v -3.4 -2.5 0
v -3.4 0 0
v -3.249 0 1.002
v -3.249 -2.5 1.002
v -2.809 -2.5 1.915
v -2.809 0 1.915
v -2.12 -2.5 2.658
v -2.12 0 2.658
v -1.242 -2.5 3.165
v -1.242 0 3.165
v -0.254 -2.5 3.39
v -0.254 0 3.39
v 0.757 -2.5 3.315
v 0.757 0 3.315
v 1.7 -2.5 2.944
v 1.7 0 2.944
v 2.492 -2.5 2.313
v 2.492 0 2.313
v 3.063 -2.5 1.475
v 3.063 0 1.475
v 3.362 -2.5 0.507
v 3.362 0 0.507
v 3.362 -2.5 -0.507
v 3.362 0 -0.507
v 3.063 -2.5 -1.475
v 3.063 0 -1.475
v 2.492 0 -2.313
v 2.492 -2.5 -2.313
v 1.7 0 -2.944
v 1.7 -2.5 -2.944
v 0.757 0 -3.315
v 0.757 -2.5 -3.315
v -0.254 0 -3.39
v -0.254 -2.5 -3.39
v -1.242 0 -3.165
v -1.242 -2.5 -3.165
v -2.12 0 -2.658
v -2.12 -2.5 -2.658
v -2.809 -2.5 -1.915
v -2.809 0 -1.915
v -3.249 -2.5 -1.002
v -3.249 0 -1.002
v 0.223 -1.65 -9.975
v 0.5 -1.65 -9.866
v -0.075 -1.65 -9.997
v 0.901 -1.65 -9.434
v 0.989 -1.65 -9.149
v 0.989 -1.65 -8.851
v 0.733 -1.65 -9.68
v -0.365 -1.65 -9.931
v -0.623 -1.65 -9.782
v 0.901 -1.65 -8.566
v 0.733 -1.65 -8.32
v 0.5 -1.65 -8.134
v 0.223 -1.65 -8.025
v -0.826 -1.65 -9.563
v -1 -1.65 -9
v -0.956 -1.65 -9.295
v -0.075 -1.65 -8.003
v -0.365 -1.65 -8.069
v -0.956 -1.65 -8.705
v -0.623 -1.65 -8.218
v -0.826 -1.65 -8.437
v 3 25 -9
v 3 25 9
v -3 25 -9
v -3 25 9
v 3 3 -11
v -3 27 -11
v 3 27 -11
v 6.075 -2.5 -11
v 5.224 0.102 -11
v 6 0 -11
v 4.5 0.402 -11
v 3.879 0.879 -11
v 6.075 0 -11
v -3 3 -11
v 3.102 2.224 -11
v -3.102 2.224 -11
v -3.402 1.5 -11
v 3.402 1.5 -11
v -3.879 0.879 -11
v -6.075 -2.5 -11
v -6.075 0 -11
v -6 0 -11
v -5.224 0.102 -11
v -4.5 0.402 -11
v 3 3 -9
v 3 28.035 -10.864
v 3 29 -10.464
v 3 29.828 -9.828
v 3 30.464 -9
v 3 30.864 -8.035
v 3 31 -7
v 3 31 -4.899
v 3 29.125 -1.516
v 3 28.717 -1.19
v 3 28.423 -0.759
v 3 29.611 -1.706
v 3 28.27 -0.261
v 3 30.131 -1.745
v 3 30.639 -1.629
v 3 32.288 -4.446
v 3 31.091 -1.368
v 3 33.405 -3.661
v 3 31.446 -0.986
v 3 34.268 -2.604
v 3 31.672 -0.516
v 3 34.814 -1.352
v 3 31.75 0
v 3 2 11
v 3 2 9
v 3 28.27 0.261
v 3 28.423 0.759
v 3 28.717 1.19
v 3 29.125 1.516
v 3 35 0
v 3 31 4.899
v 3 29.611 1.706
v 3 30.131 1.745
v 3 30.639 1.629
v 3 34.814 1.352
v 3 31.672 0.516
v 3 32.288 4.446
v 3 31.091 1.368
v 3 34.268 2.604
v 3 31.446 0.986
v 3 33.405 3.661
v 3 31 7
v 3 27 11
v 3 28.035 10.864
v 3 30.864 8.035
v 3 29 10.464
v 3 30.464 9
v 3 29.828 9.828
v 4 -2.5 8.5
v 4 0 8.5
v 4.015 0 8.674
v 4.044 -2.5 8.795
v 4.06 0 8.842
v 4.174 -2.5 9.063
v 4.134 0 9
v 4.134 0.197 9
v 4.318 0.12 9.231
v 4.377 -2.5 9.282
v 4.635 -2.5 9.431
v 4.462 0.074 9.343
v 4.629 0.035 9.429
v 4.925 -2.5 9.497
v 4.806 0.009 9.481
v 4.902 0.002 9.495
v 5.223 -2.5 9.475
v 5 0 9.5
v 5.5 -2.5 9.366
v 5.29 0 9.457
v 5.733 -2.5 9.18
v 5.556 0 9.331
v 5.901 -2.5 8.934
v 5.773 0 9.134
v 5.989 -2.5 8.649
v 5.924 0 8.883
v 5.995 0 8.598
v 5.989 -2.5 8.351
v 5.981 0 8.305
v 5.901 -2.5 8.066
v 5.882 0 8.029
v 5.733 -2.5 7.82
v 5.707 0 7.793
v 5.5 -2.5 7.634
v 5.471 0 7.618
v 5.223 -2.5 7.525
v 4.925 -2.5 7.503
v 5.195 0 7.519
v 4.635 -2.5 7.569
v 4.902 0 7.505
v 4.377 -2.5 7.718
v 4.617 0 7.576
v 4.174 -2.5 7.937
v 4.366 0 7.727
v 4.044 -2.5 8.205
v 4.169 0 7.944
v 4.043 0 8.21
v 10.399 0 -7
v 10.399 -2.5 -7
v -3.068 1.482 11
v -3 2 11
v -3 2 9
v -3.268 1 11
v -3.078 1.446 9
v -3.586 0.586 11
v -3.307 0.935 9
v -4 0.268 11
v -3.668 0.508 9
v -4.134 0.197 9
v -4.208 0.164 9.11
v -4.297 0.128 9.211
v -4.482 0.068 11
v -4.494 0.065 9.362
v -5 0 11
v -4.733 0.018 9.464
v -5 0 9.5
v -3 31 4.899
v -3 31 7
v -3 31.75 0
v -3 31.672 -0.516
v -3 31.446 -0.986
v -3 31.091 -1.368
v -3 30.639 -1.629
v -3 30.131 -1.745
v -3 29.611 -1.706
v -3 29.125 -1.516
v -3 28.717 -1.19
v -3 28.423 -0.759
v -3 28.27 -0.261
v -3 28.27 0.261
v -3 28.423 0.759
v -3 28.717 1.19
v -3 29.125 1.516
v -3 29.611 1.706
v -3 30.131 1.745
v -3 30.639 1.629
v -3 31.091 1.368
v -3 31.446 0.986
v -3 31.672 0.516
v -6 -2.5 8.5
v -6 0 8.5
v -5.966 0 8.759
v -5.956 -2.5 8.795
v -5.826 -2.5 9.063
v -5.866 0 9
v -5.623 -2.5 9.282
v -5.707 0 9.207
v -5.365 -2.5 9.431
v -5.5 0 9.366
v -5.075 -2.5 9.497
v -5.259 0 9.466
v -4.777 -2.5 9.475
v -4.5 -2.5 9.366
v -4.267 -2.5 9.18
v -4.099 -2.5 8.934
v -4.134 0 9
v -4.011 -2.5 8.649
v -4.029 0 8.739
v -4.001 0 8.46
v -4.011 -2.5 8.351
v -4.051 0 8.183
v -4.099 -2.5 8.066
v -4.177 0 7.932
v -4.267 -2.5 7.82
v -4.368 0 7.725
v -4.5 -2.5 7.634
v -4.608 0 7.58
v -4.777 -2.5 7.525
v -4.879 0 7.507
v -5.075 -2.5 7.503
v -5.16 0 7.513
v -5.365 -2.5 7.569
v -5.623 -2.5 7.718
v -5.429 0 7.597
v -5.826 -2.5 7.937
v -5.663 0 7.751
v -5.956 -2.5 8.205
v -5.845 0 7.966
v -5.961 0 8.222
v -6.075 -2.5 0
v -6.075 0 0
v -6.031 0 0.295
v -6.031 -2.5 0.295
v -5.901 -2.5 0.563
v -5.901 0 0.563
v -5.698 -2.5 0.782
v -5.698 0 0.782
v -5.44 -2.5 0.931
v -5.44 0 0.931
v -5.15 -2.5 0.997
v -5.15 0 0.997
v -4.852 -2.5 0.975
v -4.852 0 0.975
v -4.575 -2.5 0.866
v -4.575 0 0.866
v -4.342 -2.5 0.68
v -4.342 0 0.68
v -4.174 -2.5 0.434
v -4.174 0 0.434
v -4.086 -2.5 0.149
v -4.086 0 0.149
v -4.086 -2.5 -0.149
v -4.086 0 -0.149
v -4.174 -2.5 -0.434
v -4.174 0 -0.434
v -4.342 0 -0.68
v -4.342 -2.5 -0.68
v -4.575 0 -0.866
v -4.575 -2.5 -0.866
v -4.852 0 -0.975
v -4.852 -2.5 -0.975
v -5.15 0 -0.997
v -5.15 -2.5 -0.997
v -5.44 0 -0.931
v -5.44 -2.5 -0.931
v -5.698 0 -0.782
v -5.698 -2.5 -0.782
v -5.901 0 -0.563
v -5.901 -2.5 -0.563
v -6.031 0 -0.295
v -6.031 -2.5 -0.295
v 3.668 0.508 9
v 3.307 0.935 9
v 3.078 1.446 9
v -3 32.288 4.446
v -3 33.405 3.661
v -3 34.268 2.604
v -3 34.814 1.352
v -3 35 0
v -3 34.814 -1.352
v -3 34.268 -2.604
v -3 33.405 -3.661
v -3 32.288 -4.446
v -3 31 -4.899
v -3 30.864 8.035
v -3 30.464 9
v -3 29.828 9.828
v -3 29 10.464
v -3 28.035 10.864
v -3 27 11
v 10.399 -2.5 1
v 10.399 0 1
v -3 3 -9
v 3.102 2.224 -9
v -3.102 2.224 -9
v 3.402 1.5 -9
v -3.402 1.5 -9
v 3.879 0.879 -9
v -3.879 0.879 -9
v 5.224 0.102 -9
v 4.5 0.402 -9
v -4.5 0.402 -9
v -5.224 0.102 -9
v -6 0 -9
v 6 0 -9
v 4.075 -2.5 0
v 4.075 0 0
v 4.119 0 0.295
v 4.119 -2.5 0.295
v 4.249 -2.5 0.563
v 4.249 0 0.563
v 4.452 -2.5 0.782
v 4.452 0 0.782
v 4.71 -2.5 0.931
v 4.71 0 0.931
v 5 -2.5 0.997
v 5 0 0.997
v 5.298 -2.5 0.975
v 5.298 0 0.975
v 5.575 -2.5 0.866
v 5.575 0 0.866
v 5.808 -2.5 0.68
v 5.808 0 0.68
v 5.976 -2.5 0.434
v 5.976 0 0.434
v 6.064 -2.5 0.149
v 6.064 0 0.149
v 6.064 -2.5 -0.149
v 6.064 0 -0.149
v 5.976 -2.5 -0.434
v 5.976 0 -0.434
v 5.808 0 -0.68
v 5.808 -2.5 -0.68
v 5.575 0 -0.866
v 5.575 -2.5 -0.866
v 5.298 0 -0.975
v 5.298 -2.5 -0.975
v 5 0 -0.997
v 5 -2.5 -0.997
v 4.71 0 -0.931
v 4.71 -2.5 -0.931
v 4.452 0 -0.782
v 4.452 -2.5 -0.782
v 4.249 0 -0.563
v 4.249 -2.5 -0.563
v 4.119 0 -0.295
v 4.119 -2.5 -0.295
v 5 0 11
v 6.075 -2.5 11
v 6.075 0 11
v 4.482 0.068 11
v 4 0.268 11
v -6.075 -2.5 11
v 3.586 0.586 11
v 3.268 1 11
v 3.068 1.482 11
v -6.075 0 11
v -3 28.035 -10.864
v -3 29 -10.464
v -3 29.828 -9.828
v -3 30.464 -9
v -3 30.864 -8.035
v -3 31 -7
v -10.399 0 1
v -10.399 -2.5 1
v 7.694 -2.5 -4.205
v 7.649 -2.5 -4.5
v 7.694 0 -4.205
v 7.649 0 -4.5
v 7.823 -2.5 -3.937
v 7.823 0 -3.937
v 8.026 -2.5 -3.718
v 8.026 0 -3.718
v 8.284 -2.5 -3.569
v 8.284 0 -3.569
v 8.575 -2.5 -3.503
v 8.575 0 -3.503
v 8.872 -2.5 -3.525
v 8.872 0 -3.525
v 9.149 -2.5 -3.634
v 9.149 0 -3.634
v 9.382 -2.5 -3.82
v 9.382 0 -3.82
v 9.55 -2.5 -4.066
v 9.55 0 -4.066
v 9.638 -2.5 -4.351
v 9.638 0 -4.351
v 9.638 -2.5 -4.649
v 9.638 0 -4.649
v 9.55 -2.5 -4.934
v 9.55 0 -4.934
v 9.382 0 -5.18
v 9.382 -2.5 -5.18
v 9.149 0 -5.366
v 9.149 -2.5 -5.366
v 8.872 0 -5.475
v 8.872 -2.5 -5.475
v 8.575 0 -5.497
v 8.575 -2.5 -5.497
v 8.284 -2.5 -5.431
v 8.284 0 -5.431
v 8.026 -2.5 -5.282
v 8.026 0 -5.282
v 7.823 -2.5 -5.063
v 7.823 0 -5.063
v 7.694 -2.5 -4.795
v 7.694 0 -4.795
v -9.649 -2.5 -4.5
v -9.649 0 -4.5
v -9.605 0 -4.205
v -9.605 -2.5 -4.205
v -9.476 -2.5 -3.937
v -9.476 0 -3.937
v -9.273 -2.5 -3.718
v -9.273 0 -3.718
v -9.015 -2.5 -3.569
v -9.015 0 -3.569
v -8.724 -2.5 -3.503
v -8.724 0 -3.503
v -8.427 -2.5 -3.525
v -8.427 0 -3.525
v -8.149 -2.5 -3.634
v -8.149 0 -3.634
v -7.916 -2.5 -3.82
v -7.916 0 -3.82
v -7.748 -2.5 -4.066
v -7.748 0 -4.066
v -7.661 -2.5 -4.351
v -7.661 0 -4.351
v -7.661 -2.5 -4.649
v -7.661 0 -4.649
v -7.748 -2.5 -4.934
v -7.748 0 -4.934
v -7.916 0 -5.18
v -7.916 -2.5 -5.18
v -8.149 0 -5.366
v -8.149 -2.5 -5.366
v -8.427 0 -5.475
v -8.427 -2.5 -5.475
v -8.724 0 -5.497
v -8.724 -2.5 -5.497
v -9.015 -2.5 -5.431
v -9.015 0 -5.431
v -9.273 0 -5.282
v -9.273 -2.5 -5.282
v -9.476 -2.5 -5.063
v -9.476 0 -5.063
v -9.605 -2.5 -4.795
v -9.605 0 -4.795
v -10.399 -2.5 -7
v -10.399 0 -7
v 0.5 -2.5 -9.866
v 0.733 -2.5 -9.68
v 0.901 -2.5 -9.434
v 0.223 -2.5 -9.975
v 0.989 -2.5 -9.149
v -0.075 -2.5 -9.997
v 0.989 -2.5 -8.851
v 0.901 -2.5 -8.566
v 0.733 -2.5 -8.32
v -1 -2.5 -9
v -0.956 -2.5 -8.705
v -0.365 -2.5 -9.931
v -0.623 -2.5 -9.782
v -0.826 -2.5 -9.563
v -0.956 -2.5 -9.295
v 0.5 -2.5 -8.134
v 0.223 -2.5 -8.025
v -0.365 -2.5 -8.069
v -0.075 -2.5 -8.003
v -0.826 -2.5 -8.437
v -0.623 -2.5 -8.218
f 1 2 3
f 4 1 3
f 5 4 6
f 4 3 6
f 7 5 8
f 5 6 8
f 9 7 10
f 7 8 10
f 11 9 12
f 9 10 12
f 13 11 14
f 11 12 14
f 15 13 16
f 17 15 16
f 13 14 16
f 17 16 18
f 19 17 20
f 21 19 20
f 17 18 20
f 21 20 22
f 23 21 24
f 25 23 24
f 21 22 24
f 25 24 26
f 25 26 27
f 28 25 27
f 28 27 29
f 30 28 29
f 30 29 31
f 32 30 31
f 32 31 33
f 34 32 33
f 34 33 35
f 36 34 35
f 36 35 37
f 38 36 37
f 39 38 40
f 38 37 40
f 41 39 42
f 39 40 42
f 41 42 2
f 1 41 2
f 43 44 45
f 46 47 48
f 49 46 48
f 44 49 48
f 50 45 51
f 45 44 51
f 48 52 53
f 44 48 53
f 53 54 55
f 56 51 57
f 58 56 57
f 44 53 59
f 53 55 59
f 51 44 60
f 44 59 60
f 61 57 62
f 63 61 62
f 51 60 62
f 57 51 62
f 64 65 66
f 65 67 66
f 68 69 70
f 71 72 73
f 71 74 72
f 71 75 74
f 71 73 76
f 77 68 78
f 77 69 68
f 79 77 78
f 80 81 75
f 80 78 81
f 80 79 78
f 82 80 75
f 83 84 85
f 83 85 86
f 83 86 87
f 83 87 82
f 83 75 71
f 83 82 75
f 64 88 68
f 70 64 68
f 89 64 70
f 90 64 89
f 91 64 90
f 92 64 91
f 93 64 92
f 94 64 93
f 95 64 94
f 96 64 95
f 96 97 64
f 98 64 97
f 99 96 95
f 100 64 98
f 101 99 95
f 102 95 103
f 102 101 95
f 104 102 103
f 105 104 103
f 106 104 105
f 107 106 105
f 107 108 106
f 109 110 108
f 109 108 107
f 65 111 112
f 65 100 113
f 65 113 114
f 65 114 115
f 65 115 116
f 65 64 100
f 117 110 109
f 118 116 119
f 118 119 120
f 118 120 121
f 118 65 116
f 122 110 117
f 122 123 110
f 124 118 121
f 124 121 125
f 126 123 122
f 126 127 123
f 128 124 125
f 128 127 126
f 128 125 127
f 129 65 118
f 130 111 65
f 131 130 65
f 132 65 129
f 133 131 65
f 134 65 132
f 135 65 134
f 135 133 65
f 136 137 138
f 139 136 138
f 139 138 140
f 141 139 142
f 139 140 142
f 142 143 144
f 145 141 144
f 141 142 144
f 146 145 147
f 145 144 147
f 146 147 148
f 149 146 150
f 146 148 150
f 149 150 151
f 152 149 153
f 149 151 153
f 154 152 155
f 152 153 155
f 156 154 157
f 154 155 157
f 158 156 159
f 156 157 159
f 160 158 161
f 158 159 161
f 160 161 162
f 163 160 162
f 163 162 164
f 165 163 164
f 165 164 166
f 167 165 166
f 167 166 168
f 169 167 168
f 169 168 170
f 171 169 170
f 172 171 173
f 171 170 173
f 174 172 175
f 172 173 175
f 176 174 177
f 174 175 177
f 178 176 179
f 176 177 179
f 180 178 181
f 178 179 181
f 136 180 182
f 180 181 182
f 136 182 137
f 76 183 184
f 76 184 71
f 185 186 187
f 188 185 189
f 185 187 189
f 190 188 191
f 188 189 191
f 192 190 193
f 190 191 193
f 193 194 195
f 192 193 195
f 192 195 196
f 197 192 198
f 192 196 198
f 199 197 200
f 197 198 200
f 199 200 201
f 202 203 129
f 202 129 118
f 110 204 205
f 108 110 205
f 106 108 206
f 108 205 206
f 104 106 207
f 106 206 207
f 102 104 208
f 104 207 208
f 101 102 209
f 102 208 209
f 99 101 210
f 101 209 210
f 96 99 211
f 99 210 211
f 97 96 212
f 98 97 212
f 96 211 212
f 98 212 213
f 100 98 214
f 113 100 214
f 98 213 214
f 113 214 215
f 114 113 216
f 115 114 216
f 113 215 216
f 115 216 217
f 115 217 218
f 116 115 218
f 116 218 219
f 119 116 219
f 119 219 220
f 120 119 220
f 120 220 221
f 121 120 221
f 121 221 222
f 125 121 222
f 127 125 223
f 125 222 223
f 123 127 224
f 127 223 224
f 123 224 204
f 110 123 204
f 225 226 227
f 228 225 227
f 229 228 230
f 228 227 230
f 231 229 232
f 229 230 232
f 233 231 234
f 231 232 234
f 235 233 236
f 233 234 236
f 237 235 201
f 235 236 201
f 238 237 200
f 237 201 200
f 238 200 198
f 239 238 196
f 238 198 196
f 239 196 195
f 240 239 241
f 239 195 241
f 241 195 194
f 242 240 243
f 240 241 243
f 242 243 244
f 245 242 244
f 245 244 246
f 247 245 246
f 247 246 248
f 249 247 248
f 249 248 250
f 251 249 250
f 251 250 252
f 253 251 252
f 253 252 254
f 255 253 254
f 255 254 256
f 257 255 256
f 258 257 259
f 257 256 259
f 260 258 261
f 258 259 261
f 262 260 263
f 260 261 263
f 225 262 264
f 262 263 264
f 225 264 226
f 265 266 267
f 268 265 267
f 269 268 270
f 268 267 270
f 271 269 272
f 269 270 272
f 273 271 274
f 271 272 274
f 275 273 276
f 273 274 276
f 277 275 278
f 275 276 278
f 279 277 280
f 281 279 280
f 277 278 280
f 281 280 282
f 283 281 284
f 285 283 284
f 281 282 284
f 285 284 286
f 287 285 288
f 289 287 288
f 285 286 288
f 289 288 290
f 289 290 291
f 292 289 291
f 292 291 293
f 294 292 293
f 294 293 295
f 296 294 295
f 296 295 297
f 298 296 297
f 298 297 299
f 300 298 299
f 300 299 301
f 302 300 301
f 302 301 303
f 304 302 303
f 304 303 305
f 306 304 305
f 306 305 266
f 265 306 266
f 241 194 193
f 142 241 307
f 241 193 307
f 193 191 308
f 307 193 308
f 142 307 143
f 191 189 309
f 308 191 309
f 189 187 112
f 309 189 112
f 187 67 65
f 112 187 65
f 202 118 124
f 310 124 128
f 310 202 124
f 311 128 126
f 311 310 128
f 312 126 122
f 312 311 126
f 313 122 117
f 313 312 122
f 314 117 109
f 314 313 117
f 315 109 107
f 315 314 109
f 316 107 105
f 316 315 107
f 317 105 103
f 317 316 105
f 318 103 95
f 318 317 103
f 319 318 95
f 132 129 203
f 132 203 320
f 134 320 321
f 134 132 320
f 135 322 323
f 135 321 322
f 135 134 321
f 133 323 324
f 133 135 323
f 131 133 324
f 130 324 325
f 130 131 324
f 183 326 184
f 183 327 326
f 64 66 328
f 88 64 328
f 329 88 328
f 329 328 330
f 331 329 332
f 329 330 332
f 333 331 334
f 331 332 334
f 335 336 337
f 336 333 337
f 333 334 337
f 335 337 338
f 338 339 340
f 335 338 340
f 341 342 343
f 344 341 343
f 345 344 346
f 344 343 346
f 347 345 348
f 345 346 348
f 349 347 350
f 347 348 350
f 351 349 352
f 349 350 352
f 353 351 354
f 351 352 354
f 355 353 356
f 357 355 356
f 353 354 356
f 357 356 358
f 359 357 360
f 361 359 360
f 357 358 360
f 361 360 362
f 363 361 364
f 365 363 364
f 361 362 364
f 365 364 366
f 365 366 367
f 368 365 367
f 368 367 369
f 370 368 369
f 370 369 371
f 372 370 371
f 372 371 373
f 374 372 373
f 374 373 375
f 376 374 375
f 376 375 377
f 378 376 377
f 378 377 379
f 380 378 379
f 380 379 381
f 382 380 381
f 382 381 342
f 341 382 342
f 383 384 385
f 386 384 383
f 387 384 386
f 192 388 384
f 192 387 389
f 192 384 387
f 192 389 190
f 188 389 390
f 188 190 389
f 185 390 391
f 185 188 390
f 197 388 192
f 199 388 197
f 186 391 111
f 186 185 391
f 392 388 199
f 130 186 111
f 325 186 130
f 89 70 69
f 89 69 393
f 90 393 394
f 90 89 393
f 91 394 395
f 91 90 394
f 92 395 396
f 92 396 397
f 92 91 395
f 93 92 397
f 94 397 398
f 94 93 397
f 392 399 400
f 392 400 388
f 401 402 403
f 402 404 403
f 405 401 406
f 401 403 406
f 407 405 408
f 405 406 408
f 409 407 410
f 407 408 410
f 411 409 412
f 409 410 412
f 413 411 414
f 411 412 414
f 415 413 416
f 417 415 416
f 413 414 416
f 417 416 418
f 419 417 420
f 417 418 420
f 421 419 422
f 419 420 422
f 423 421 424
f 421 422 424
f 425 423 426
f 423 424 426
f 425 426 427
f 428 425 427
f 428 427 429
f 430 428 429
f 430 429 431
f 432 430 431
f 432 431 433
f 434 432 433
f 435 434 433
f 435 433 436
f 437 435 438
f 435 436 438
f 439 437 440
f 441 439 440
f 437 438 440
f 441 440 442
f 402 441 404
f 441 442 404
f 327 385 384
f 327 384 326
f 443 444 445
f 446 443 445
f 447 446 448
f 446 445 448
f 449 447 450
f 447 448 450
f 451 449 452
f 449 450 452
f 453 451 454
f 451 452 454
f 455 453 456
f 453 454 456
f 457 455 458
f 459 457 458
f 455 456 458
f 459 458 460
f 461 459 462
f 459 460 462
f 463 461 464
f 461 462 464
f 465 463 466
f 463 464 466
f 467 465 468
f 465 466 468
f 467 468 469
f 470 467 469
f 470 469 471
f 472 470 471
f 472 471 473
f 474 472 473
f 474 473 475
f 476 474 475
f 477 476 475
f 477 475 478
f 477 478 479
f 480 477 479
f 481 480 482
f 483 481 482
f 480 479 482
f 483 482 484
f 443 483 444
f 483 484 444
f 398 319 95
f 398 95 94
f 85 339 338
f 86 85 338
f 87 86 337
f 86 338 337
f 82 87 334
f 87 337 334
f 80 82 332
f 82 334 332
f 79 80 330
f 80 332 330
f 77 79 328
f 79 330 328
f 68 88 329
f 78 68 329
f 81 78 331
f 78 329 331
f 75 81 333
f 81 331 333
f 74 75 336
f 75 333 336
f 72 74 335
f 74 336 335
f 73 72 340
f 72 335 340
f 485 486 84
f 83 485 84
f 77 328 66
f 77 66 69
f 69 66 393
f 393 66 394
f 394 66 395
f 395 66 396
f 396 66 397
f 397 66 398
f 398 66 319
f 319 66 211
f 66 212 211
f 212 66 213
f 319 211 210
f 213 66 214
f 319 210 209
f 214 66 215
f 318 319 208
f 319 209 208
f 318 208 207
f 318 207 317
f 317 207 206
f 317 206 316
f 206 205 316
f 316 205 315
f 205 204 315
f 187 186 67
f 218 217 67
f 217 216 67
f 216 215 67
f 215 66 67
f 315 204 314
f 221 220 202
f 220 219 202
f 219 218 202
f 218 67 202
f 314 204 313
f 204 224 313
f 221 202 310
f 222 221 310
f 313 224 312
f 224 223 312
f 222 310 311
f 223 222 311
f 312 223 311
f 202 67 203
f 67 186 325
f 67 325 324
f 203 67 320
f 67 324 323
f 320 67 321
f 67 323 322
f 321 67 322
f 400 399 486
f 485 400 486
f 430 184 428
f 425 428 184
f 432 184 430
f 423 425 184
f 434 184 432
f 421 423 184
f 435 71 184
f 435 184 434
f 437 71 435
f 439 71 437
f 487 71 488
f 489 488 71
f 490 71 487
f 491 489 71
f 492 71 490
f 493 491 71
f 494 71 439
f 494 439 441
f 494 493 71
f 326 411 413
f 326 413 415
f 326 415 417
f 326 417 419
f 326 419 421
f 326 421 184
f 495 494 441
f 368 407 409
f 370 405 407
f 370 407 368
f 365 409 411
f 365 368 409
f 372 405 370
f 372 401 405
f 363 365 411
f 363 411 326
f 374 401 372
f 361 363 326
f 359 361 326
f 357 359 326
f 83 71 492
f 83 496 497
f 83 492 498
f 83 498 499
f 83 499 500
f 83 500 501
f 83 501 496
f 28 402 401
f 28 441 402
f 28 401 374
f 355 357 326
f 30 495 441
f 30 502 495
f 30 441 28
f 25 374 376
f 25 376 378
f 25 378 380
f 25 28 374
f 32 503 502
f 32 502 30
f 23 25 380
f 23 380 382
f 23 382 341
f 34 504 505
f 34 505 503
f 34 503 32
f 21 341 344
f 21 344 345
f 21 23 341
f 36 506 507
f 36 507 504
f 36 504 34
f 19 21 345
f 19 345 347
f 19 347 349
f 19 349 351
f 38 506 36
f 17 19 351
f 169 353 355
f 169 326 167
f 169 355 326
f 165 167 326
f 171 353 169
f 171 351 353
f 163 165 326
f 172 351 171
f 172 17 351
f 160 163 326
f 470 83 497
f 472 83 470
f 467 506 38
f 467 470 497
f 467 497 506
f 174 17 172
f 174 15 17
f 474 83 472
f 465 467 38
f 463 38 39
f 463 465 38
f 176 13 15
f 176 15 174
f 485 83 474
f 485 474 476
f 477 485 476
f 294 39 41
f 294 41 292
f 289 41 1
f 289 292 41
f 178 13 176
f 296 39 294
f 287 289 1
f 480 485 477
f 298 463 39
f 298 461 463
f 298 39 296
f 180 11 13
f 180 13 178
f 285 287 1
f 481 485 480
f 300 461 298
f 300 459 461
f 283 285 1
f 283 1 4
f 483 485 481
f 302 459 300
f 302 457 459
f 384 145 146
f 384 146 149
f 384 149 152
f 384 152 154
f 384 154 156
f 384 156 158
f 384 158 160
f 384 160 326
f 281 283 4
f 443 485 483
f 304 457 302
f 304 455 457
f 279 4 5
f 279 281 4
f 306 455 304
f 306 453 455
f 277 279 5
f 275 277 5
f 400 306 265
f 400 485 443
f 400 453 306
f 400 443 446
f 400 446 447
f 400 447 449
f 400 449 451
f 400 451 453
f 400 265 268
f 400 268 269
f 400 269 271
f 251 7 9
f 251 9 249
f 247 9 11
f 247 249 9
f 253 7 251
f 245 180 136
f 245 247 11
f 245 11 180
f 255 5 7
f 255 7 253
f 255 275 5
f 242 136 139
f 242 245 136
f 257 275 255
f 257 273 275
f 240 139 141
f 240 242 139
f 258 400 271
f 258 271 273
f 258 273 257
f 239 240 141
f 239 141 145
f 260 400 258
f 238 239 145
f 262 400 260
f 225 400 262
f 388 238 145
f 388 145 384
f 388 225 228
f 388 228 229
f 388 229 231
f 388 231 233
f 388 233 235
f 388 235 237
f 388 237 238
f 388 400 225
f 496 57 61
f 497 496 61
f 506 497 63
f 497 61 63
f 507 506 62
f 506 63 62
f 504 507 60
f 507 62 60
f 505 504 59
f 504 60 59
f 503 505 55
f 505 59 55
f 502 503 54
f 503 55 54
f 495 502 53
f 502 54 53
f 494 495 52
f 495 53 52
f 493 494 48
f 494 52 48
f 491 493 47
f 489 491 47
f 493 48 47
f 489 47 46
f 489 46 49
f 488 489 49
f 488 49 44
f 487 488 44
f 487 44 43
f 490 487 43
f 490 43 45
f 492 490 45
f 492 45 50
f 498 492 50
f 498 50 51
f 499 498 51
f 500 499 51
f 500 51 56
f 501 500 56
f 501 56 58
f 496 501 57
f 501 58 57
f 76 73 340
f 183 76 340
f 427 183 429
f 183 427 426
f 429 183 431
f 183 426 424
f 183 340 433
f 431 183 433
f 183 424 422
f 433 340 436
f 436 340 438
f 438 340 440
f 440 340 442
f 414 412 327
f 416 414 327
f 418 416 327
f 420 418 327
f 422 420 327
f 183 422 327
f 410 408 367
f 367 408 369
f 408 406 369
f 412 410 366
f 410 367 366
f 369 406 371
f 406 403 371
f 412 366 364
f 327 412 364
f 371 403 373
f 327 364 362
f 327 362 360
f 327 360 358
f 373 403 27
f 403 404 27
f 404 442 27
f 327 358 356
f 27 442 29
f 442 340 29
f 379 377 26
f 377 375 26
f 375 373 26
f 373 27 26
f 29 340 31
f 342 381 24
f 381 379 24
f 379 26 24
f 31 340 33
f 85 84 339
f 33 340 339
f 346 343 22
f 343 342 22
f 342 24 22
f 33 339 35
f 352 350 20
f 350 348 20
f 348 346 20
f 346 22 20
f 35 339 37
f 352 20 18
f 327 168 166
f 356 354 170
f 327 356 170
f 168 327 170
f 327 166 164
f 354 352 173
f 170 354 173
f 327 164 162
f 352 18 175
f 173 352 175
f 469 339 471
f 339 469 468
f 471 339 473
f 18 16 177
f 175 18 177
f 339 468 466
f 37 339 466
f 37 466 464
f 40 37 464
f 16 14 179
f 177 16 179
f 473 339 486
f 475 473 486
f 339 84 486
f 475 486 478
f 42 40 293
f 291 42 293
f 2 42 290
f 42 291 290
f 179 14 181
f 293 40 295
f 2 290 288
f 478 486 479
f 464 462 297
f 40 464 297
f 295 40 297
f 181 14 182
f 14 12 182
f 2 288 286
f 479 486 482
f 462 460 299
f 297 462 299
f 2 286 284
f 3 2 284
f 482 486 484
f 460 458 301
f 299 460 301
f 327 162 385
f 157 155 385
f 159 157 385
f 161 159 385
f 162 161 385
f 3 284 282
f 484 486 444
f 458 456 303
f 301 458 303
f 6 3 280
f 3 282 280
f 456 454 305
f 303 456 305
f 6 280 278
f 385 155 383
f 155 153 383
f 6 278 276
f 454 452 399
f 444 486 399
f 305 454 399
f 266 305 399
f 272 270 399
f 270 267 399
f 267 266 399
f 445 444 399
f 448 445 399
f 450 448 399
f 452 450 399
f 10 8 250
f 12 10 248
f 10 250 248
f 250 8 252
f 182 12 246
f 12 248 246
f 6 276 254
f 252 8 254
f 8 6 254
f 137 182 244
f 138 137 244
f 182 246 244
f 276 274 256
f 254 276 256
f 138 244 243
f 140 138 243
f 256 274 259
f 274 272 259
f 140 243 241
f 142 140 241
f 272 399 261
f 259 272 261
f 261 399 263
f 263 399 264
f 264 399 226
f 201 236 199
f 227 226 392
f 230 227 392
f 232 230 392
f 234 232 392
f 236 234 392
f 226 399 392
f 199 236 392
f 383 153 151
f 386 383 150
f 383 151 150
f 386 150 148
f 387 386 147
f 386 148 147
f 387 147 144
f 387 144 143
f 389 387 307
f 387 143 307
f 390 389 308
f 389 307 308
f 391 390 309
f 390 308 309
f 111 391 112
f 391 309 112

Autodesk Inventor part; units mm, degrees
ref_plane "YZ Plane" through (0, 0, 0) normal (1, 0, 0) x (0, 1, 0)
ref_plane "XZ Plane" through (0, 0, 0) normal (0, 1, 0) x (-1, 0, 0)
ref_plane "XY Plane" through (0, 0, 0) normal (0, 0, 1) x (1, 0, 0)
sketch "sk_main" plane through (0, 0, 0) normal (1, 0, 0) x (0, 1, 0)
  line L0 (-10, 0) -> (42.5, 0) projected
  line L1 (0, -15.4) -> (0, 15.4) projected
  line L2 (25, -9) -> (0, -9)
  line L3 (0, -9) -> (0, 9)
  line L4 (0, 9) -> (25, 9)
  line L5 (25, 9) -> (25, -9)
  line L6 (25, -9) -> (0, 9) construction
  line L7 (0, -9) -> (25, 9) construction
  circle A0 centre (30, 0) radius 1.75
  circle A1 centre (30, 0) radius 5 construction
  line L8 (-2.5, 11) -> (31, 11)
  line L9 (31, 11) -> (31, 4.899)
  line L10 (31, -4.899) -> (31, -11)
  line L11 (31, -11) -> (-2.5, -11)
  line L12 (-2.5, -11) -> (-2.5, 11)
  arc A2 (31, -4.899) -> (31, 4.899) centre (30, 0) ccw
  line L13 (0, 11) -> (0, -11)
  point P0 (0, 0)
  point P1 (12.5, 0)
  dimension "d0" = 25
  dimension "d1" = 18
  dimension "d2" = 3.5
  dimension "d3" = 5
  dimension "d4" = 2
  dimension "d5" = 2.5
  dimension "d6" = 1
extrude "ext_main_back" add sketch "sk_main" along normal mid plane 6 contours L5 L4 L1 L8 L9 A2 L0 A0 | L0 A0 A2 L10 L11 L1 L2 L5
extrude "ext_main_front" add sketch "sk_main" along normal mid plane 12.15 contours L12 L8 L1 L0 | L0 L1 L11 L12
sketch "sk_front" plane through (0, 0, 0) normal (0, 1, 0) x (-1, 0, 0)
  line L0 (0, -15.4) -> (0, 15.4) projected
  line L1 (8.505, 0) -> (-8.505, 0) projected
  circle A0 centre (0, 0) radius 3.4
  circle A1 centre (5.075, 0) radius 1
  circle A2 centre (-5.075, 0) radius 1
  circle A3 centre (0, 0) radius 8 construction
  circle A4 centre (0, -9) radius 8 construction
  circle A5 centre (0, -9) radius 1
  circle A6 centre (8.6494, -4.5) radius 1.75 construction
  circle A7 centre (-8.6494, -4.5) radius 1.75 construction
  line L2 (8.6494, -4.5) -> (-8.6494, -4.5) construction
  line L3 (-6.075, 11) -> (-6.075, -11) projected
  line L4 (6.075, -11) -> (6.075, 11) projected
  line L5 (10.3994, 1) -> (10.3994, -7)
  line L6 (10.3994, 1) -> (6.075, 11)
  line L7 (10.3994, -7) -> (6.075, -11)
  line L8 (-6.075, 11) -> (-10.3994, 1)
  line L9 (-10.3994, 1) -> (-10.3994, -7)
  line L10 (-10.3994, -7) -> (-6.075, -11)
  line L11 (6.075, -11) -> (-6.075, -11) projected
  circle A8 centre (-8.6494, -4.5) radius 1
  circle A9 centre (8.6494, -4.5) radius 1
  circle A10 centre (-5, 8.5) radius 1
  circle A11 centre (-5, 8.5) radius 2.25 construction
  line L12 (-5, 8.5) -> (5, 8.5) construction
  circle A12 centre (5, 8.5) radius 2.25 construction
  circle A13 centre (5, 8.5) radius 1
  point P0 (0, 8.5)
  dimension "d11" = 6.8
  dimension "d12" = 2
  dimension "d13" = 10.15
  dimension "d14" = 16
  dimension "d15" = 16
  dimension "d16" = 9
  dimension "d17" = 2
  dimension "d18" = 3.5
  dimension "d21" = 8
  dimension "d22" = 4
  dimension "d26" = 2
  dimension "d27" = 2
  dimension "d28" = 4.5
  dimension "d30" = 10
  dimension "d31" = 8.5
extrude "ext_front_tabs" add sketch "sk_front" against normal up to surface (2.5 mm away) contours L4 L6 L5 L7 | L10 L9 L8 L3 | A8 | A9
extrude "ext_cut_holesfront" cut sketch "sk_front" against normal through all contours A5 L0 | L0 A5 | A1 L1 | L1 A1 | A2 L1 | L1 A2 | A0 L1 L0 | L0 L1 A0 | L1 A0 L0 | L0 A0 L1 | A8 | A9 | A10 | A13
fillet "Fillet2" radius 2 2 edges at (3, 0, 10) (-3, 0, 10)
fillet "Fillet3" radius 3 2 edges at (3, 0, -10) (-3, 0, -10)
fillet "Fillet4" radius 4 2 edges at (0, 31, 11) (0, 31, -11)
extrude "ext_dowelfill" add sketch "sk_front" against normal blind 1.65 contours A5 L0 | L0 A5
equation "\"d2\" = screw_m3_bore_loose"
equation "\"d12\" = screw_m2_bore_selfthreading"
equation "\"d17\" = screw_m2_bore_selfthreading"
equation "\"d26\" = screw_m2_bore_selfthreading"
equation "\"d27\" = screw_m2_bore_selfthreading"
equation "\"d28\" = screw_m2_head_maxsize"
equation "\"screw_m3_bore_loose\" = 3.5"
equation "\"screw_m2_bore_selfthreading\" = 2"
equation "\"screw_m2_head_maxsize\" = 4.5"
properties part number "empty"
